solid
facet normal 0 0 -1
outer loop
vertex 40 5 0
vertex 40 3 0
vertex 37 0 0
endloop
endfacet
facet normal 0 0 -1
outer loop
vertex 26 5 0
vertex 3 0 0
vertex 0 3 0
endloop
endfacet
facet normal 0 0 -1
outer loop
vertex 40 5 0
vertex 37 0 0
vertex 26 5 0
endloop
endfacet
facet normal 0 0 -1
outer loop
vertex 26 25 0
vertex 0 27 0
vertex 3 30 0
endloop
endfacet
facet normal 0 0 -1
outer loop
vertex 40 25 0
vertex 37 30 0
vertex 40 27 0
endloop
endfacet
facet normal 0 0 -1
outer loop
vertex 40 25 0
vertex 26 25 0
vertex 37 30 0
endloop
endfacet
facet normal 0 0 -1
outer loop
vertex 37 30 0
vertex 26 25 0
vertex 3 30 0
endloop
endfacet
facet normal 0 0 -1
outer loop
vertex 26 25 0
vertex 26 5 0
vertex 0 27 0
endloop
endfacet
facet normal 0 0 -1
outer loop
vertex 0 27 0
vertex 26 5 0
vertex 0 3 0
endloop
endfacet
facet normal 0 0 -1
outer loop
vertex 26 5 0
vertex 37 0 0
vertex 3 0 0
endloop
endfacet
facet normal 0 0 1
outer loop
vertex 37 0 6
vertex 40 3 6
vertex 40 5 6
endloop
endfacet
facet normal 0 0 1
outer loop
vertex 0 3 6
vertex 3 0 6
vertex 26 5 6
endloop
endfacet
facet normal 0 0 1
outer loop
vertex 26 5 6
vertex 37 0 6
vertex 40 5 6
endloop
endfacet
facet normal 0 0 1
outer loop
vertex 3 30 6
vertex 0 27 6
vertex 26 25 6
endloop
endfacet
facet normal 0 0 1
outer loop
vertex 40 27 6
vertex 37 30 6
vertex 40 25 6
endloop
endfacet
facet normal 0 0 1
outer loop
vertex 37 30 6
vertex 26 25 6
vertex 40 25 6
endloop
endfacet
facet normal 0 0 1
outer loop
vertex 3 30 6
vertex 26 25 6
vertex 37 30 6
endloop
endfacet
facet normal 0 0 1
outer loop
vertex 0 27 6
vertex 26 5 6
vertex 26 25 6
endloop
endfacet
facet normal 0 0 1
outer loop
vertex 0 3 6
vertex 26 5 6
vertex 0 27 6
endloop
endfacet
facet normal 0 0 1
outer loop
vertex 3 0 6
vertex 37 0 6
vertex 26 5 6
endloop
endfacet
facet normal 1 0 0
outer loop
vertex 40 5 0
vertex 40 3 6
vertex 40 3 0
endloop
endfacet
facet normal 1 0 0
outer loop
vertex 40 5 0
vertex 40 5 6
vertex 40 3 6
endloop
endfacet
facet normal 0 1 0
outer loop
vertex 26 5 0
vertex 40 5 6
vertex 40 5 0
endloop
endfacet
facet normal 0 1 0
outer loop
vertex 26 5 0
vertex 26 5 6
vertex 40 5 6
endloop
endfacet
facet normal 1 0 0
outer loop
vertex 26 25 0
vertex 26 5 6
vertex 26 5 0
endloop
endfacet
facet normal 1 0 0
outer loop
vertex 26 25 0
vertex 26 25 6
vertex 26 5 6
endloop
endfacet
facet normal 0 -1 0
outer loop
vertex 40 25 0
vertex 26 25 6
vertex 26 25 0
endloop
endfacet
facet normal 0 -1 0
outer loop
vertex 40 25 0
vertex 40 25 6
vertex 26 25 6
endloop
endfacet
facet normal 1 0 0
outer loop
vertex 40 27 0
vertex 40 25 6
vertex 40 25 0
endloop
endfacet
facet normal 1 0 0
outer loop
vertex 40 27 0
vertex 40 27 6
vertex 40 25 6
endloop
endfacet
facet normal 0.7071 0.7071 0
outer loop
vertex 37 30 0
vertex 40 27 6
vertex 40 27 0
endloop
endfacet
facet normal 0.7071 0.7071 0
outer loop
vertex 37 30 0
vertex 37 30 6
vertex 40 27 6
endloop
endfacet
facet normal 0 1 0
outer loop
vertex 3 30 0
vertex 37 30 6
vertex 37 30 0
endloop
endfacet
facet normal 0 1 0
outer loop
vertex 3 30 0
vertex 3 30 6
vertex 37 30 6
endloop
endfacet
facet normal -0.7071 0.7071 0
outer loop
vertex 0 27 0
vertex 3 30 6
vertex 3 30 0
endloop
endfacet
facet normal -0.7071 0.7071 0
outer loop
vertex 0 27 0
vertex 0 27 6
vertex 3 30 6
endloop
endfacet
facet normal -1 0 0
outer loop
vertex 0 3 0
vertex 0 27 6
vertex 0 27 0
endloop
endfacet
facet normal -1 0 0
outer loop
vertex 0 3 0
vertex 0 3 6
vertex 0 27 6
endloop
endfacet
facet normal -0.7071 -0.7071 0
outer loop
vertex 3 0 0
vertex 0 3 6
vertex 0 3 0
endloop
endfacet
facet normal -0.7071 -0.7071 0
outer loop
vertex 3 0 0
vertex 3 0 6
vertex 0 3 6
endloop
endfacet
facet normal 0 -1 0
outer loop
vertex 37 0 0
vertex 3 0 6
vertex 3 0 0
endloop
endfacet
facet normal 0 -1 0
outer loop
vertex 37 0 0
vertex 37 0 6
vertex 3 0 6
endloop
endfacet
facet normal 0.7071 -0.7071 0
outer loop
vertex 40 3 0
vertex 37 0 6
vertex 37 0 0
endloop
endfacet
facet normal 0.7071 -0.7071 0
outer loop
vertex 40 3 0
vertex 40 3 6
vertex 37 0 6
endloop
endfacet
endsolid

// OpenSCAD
$fn = 32;

// ----------------------------------------------------------------------
// C washer: 40 x 30 mm plate with an open slot
// ----------------------------------------------------------------------

// --- parameters (mm) ---
profile_height = 6;       // extrusion height
profile_points = 12;      // points of the closed outline

profile = [[3, 0], [37, 0], [40, 3], [40, 5], [26, 5], [26, 25], [40, 25], [40, 27], [37, 30], [3, 30], [0, 27], [0, 3]];  // single closed polygon, 12 points, counter clockwise

// --- the one profile operation ---
linear_extrude(height = profile_height) polygon(points = profile);
